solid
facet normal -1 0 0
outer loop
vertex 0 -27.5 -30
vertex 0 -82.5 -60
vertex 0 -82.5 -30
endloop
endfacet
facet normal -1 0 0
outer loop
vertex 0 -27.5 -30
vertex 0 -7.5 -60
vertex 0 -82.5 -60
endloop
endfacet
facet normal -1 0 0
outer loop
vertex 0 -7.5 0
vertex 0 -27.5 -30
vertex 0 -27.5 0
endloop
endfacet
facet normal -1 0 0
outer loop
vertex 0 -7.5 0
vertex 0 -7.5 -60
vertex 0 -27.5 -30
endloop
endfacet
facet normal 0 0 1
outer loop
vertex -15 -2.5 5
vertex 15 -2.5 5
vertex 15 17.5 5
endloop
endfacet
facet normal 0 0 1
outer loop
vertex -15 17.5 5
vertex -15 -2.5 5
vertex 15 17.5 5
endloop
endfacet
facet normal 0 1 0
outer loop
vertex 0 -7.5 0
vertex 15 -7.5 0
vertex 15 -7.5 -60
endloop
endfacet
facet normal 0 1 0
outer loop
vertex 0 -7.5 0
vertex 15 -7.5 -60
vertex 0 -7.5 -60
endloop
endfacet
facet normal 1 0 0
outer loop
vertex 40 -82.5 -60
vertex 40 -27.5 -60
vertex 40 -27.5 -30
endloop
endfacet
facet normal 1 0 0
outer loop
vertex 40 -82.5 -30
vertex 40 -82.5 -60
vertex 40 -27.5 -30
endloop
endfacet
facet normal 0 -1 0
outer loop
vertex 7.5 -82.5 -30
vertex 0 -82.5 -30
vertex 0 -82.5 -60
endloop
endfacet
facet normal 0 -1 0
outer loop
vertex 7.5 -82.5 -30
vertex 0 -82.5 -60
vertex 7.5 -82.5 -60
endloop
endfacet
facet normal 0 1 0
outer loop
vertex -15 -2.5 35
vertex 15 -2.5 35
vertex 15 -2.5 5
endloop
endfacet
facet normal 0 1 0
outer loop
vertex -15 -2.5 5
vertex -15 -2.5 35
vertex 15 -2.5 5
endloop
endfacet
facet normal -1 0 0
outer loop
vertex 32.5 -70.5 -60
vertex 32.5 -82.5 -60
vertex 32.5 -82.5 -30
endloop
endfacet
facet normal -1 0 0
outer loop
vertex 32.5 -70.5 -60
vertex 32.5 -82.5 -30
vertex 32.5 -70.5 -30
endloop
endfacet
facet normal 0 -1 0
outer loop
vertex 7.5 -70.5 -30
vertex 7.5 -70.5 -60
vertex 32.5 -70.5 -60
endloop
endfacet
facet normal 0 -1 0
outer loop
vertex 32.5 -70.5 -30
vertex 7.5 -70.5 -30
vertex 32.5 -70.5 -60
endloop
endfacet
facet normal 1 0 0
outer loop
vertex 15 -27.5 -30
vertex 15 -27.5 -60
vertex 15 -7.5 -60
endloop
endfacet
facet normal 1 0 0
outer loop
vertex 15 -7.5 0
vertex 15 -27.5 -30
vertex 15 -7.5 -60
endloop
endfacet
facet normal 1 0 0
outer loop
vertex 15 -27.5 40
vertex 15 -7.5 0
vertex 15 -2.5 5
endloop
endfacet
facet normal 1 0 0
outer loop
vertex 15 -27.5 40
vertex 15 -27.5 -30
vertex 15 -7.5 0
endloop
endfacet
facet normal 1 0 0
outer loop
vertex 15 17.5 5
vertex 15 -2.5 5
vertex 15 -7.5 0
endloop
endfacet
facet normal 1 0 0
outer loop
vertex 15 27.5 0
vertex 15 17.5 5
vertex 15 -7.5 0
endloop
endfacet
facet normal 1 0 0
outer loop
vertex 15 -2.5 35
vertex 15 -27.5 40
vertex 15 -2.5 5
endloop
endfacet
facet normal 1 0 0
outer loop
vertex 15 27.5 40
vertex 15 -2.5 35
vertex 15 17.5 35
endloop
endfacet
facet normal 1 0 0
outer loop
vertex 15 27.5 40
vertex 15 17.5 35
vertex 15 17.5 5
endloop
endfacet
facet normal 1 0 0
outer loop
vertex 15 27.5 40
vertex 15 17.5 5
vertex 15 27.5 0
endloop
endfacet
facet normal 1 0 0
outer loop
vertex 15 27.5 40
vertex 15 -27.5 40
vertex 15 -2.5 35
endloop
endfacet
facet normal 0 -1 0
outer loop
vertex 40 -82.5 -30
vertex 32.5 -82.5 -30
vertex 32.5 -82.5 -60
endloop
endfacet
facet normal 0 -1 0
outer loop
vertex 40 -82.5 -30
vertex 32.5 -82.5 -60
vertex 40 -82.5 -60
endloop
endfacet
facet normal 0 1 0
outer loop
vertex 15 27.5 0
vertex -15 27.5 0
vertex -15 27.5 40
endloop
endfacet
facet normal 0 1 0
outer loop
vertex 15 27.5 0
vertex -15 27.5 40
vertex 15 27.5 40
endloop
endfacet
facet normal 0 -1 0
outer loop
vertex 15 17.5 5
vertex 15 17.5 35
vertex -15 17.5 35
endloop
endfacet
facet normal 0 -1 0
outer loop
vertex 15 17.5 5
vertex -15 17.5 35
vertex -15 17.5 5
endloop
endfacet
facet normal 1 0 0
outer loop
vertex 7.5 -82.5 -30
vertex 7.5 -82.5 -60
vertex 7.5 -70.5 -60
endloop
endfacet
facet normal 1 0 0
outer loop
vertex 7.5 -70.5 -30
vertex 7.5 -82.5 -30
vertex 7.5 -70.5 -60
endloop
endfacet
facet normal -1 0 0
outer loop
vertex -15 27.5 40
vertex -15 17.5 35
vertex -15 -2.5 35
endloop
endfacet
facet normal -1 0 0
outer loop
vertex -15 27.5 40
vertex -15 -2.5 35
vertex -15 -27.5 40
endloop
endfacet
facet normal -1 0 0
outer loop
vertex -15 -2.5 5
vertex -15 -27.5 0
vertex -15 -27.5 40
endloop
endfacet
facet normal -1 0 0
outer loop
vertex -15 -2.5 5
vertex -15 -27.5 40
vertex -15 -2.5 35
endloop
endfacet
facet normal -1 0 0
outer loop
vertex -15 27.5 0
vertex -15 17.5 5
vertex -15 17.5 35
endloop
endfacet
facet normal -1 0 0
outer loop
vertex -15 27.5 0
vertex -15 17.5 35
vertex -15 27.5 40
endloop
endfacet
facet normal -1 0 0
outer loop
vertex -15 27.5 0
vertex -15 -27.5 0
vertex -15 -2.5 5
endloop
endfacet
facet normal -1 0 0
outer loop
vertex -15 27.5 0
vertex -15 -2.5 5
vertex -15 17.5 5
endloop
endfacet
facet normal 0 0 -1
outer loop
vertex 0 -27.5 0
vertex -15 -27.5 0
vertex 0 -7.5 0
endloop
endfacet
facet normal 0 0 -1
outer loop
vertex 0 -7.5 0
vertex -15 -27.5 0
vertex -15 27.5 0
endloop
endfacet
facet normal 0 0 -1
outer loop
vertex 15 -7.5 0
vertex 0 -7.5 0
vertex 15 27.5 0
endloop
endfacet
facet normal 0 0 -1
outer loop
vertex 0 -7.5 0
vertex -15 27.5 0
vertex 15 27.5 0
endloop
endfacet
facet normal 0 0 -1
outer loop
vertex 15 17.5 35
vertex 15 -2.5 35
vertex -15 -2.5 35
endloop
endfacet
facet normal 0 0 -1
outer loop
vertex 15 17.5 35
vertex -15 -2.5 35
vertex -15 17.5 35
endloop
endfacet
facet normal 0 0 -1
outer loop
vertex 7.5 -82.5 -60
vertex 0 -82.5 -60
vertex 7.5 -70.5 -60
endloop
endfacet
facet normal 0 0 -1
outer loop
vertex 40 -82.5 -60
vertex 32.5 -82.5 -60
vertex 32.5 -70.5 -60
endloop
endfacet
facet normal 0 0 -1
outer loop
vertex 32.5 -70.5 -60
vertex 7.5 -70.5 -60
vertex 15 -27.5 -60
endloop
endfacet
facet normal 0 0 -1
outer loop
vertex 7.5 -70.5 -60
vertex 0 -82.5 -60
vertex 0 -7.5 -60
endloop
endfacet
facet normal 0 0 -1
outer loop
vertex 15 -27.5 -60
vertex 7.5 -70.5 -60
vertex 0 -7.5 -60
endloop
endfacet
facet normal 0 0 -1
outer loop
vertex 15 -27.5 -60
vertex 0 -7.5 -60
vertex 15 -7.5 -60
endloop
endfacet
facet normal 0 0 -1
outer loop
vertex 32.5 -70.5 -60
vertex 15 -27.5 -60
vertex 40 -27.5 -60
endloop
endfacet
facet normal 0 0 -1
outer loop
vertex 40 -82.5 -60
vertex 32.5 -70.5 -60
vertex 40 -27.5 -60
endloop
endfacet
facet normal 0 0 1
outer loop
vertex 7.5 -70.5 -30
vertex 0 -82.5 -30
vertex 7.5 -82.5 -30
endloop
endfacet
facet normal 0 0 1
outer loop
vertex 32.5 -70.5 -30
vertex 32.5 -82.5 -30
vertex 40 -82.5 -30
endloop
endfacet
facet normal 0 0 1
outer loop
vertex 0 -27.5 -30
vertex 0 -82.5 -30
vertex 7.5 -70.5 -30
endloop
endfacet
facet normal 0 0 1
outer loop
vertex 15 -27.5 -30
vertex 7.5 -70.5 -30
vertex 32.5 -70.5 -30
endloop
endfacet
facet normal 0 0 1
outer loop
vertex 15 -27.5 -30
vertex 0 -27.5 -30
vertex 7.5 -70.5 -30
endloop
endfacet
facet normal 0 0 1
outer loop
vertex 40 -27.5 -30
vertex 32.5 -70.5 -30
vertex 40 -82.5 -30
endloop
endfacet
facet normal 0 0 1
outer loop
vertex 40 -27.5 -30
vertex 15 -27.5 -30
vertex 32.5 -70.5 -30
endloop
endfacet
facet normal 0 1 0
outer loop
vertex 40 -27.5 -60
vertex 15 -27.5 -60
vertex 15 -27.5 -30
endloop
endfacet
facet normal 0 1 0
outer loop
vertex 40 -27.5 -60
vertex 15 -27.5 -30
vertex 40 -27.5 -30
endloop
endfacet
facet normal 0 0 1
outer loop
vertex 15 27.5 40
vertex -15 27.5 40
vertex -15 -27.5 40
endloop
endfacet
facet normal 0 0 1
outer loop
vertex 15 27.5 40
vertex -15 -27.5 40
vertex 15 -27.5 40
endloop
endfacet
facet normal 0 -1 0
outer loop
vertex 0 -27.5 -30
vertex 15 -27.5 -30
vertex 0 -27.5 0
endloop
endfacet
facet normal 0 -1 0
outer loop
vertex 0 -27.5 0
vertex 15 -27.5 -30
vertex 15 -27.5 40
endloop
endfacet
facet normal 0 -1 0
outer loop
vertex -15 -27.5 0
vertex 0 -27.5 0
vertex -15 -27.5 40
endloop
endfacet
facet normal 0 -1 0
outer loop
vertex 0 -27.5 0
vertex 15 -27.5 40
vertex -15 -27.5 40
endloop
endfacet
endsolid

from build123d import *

# Parameters (mm, degrees)
SKETCH_1_W          = 30
SKETCH_1_H          = 55
EXTRUDE_1_DEPTH     = 40
SKETCH_4_W          = 30
SKETCH_4_H          = 20
CUT_EXTRUDE_1_DEPTH = 58.063561053
SKETCH_5_W          = 15
SKETCH_5_H          = 20
EXTRUDE_3_DEPTH     = 60
SKETCH_6_W          = 40
SKETCH_6_H          = 30
EXTRUDE_4_DEPTH     = 55
SKETCH_7_W          = 25
SKETCH_7_H          = 12
CUT_EXTRUDE_2_DEPTH = 116.352719951


with BuildPart() as part:
    # Эскиз1 → Бобышка-Вытянуть1 (new body)
    with BuildSketch(Plane.XY):
        Rectangle(SKETCH_1_W, SKETCH_1_H)
    extrude(amount=EXTRUDE_1_DEPTH)

    # Эскиз4 → Вырез-Вытянуть1 (cut, through all)
    with BuildSketch(Plane(origin=(15, 0, 0), x_dir=(0, 0, -1), z_dir=(1, 0, 0))):
        with Locations((-20, 7.5)):
            Rectangle(SKETCH_4_W, SKETCH_4_H)
    extrude(amount=-CUT_EXTRUDE_1_DEPTH, mode=Mode.SUBTRACT)

    # Эскиз5 → Бобышка-Вытянуть3 (add)
    with BuildSketch(Plane(origin=(0, 0, 0), x_dir=(-1, 0, 0), z_dir=(0, 0, -1))):
        with Locations((-7.5, -17.5)):
            Rectangle(SKETCH_5_W, SKETCH_5_H)
    extrude(amount=EXTRUDE_3_DEPTH)

    # Эскиз6 → Бобышка-Вытянуть4 (add)
    with BuildSketch(Plane.XZ.offset(27.5)):
        with Locations((20, -45)):
            Rectangle(SKETCH_6_W, SKETCH_6_H)
    extrude(amount=EXTRUDE_4_DEPTH)

    # Эскиз7 → Вырез-Вытянуть2 (cut, through all)
    with BuildSketch(Plane.XY.offset(-30)):
        with Locations((20, -76.5)):
            Rectangle(SKETCH_7_W, SKETCH_7_H)
    extrude(amount=-CUT_EXTRUDE_2_DEPTH, mode=Mode.SUBTRACT)


solid = part.part
